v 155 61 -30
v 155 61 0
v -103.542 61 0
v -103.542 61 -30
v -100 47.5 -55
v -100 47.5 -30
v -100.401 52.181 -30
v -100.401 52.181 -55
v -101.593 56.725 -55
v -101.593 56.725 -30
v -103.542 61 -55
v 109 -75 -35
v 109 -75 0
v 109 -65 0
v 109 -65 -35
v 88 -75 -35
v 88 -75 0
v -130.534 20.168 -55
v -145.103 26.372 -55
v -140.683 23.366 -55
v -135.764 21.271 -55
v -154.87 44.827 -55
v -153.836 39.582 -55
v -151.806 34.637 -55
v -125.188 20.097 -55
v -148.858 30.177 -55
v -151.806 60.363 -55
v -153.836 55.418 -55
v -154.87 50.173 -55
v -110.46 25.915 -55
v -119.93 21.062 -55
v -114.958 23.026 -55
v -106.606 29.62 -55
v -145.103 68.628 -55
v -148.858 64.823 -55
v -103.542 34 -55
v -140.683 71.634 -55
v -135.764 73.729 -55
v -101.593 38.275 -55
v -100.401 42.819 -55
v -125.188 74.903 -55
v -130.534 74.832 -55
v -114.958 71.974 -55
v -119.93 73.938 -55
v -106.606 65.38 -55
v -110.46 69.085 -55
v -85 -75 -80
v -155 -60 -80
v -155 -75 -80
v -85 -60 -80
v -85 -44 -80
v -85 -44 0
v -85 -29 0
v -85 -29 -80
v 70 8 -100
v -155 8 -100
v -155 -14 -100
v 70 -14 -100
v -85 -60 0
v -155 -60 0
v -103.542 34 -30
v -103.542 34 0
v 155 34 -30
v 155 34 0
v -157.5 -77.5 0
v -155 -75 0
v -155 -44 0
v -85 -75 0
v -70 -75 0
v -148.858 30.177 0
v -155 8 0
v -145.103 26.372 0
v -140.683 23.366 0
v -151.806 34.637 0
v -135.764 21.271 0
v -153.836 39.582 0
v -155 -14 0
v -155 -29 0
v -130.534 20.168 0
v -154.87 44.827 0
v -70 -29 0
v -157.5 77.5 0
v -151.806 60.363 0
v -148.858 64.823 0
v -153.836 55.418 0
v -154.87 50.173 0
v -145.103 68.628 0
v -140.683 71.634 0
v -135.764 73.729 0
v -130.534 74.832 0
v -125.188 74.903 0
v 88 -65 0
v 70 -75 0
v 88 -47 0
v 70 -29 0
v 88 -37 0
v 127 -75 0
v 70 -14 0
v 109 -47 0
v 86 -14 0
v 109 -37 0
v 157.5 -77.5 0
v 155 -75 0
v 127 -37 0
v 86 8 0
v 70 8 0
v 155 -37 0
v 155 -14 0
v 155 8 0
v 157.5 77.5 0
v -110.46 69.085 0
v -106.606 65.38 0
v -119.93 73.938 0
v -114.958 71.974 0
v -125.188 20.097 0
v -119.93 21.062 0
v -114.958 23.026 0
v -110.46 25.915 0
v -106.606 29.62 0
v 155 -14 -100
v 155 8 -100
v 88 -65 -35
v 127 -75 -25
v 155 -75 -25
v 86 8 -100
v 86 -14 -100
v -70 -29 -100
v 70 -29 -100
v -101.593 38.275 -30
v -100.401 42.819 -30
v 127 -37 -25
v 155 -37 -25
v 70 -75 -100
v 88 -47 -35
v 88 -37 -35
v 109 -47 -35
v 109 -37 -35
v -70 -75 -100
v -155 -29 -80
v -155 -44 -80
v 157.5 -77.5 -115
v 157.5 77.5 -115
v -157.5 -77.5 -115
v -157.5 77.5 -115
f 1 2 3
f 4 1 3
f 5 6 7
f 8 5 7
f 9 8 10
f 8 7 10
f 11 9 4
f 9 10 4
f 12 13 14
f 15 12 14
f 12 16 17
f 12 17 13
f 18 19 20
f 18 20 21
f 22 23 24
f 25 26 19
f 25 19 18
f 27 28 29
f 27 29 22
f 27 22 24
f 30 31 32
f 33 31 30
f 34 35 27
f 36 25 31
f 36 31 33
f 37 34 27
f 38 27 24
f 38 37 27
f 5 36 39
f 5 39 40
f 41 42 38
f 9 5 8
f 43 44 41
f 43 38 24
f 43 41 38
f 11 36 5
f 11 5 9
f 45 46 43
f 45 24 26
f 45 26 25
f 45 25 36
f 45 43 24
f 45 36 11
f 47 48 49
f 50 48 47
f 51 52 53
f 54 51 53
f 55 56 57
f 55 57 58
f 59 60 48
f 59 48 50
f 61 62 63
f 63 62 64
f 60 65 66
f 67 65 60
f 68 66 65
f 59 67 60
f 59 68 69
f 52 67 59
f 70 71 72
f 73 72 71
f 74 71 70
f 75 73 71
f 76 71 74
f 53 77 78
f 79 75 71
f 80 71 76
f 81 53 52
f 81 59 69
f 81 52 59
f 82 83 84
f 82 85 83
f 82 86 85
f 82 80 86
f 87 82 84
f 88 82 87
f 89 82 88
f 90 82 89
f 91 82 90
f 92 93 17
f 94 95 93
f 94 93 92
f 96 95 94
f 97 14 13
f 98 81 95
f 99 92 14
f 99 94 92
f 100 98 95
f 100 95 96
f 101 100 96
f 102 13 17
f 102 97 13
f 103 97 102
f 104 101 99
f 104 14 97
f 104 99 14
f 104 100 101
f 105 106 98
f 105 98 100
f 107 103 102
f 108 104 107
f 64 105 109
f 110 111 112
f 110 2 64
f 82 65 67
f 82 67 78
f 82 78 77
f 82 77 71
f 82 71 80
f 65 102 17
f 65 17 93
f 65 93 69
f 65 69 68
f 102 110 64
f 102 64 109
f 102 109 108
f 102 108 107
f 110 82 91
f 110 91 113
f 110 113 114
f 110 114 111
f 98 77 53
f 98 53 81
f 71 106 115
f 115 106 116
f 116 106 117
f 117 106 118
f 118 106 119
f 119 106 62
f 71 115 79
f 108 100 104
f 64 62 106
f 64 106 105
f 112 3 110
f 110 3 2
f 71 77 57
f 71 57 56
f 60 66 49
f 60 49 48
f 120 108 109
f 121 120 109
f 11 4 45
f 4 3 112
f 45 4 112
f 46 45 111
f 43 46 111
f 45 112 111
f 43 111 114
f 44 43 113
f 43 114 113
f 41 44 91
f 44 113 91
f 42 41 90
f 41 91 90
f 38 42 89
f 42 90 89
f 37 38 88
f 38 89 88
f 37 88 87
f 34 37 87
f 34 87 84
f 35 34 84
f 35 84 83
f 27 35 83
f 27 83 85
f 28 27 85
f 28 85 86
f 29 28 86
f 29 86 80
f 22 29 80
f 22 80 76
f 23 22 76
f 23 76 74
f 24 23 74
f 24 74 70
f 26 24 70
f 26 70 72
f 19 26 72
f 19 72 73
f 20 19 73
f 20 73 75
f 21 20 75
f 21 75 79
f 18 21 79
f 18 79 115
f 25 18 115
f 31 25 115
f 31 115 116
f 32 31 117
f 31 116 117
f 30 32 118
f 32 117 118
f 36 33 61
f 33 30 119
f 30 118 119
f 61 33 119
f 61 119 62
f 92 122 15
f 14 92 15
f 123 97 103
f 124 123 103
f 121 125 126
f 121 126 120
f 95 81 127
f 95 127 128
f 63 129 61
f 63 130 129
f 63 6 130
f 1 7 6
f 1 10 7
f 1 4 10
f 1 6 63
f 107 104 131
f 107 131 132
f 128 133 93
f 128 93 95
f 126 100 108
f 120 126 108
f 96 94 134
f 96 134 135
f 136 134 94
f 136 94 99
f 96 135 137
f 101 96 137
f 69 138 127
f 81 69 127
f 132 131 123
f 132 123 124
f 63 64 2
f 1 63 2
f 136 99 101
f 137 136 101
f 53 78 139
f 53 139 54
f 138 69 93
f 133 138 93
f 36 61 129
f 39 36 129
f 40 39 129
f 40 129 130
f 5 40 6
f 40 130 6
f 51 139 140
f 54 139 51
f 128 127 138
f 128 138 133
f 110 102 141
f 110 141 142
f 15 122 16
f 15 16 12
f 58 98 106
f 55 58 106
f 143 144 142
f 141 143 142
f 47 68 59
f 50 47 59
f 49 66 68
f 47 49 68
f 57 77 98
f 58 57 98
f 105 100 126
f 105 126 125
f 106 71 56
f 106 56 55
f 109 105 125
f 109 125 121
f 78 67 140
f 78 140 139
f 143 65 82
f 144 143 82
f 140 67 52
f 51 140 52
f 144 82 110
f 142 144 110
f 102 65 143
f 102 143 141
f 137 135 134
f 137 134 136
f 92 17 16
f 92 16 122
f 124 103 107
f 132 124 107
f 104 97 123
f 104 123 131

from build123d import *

# Parameters (mm, degrees)
F0_W      = 315
F0_H      = 155
F1_DEPTH  = 115
F3_W      = 225
F3_H      = 22
F9_DEPTH  = 100
F10_DEPTH = 55
F11_DEPTH = 30
F4_W      = 70
F4_H      = 15
F12_DEPTH = 80
F5_W      = 140
F5_H      = 46
F13_DEPTH = 100
F6_W      = 69
F6_H      = 22
F14_DEPTH = 100
F7_W      = 21
F7_H      = 10
F15_DEPTH = 35
F8_W      = 28
F8_H      = 38
F16_DEPTH = 25


with BuildPart() as f1:
    # F0 (on Top) → F1 (new body)
    with BuildSketch(Plane.XY):
        Rectangle(F0_W, F0_H)
    extrude(amount=-F1_DEPTH)

    # F3 (on face) → F9 (cut)
    with BuildSketch(Plane.XY):
        with Locations((-42.5, -3)):
            Rectangle(F3_W, F3_H)
    extrude(amount=-F9_DEPTH, mode=Mode.SUBTRACT)

    # F2 (on face) → F10 (cut)
    with BuildSketch(Plane.XY):
        with BuildLine():
            ThreePointArc((-103.541703, 34), (-100.900158, 40.521575), (-100, 47.5))
            ThreePointArc((-100, 47.5), (-100.900158, 54.478425), (-103.541703, 61))
            ThreePointArc((-103.541703, 61), (-155, 47.5), (-103.541703, 34))
        make_face()
    extrude(amount=-F10_DEPTH, mode=Mode.SUBTRACT)

    # F4 (on face) → F11 (cut)
    with BuildSketch(Plane.XY):
        with BuildLine():
            ThreePointArc((-103.541703, 61), (-155, 47.5), (-103.541703, 34))
            Line((-103.541703, 34), (155, 34))
            Line((155, 34), (155, 61))
            Line((155, 61), (-103.541703, 61))
        make_face()
    extrude(amount=-F11_DEPTH, mode=Mode.SUBTRACT)

    # F4 (on face) → F12 (cut)
    with BuildSketch(Plane.XY):
        with Locations((-120, -36.5)):
            Rectangle(F4_W, F4_H)
        with Locations((-120, -67.5)):
            Rectangle(F4_W, F4_H)
    extrude(amount=-F12_DEPTH, mode=Mode.SUBTRACT)

    # F5 (on face) → F13 (cut)
    with BuildSketch(Plane.XY):
        with Locations((0, -52)):
            Rectangle(F5_W, F5_H)
    extrude(amount=-F13_DEPTH, mode=Mode.SUBTRACT)

    # F6 (on face) → F14 (cut)
    with BuildSketch(Plane.XY):
        with Locations((120.5, -3)):
            Rectangle(F6_W, F6_H)
    extrude(amount=-F14_DEPTH, mode=Mode.SUBTRACT)

    # F7 (on face) → F15 (cut)
    with BuildSketch(Plane.XY):
        with Locations((98.5, -42)):
            Rectangle(F7_W, F7_H)
        with Locations((98.5, -70)):
            Rectangle(F7_W, F7_H)
    extrude(amount=-F15_DEPTH, mode=Mode.SUBTRACT)

    # F8 (on face) → F16 (cut)
    with BuildSketch(Plane.XY):
        with Locations((141, -56)):
            Rectangle(F8_W, F8_H)
    extrude(amount=-F16_DEPTH, mode=Mode.SUBTRACT)


solid = f1.part
